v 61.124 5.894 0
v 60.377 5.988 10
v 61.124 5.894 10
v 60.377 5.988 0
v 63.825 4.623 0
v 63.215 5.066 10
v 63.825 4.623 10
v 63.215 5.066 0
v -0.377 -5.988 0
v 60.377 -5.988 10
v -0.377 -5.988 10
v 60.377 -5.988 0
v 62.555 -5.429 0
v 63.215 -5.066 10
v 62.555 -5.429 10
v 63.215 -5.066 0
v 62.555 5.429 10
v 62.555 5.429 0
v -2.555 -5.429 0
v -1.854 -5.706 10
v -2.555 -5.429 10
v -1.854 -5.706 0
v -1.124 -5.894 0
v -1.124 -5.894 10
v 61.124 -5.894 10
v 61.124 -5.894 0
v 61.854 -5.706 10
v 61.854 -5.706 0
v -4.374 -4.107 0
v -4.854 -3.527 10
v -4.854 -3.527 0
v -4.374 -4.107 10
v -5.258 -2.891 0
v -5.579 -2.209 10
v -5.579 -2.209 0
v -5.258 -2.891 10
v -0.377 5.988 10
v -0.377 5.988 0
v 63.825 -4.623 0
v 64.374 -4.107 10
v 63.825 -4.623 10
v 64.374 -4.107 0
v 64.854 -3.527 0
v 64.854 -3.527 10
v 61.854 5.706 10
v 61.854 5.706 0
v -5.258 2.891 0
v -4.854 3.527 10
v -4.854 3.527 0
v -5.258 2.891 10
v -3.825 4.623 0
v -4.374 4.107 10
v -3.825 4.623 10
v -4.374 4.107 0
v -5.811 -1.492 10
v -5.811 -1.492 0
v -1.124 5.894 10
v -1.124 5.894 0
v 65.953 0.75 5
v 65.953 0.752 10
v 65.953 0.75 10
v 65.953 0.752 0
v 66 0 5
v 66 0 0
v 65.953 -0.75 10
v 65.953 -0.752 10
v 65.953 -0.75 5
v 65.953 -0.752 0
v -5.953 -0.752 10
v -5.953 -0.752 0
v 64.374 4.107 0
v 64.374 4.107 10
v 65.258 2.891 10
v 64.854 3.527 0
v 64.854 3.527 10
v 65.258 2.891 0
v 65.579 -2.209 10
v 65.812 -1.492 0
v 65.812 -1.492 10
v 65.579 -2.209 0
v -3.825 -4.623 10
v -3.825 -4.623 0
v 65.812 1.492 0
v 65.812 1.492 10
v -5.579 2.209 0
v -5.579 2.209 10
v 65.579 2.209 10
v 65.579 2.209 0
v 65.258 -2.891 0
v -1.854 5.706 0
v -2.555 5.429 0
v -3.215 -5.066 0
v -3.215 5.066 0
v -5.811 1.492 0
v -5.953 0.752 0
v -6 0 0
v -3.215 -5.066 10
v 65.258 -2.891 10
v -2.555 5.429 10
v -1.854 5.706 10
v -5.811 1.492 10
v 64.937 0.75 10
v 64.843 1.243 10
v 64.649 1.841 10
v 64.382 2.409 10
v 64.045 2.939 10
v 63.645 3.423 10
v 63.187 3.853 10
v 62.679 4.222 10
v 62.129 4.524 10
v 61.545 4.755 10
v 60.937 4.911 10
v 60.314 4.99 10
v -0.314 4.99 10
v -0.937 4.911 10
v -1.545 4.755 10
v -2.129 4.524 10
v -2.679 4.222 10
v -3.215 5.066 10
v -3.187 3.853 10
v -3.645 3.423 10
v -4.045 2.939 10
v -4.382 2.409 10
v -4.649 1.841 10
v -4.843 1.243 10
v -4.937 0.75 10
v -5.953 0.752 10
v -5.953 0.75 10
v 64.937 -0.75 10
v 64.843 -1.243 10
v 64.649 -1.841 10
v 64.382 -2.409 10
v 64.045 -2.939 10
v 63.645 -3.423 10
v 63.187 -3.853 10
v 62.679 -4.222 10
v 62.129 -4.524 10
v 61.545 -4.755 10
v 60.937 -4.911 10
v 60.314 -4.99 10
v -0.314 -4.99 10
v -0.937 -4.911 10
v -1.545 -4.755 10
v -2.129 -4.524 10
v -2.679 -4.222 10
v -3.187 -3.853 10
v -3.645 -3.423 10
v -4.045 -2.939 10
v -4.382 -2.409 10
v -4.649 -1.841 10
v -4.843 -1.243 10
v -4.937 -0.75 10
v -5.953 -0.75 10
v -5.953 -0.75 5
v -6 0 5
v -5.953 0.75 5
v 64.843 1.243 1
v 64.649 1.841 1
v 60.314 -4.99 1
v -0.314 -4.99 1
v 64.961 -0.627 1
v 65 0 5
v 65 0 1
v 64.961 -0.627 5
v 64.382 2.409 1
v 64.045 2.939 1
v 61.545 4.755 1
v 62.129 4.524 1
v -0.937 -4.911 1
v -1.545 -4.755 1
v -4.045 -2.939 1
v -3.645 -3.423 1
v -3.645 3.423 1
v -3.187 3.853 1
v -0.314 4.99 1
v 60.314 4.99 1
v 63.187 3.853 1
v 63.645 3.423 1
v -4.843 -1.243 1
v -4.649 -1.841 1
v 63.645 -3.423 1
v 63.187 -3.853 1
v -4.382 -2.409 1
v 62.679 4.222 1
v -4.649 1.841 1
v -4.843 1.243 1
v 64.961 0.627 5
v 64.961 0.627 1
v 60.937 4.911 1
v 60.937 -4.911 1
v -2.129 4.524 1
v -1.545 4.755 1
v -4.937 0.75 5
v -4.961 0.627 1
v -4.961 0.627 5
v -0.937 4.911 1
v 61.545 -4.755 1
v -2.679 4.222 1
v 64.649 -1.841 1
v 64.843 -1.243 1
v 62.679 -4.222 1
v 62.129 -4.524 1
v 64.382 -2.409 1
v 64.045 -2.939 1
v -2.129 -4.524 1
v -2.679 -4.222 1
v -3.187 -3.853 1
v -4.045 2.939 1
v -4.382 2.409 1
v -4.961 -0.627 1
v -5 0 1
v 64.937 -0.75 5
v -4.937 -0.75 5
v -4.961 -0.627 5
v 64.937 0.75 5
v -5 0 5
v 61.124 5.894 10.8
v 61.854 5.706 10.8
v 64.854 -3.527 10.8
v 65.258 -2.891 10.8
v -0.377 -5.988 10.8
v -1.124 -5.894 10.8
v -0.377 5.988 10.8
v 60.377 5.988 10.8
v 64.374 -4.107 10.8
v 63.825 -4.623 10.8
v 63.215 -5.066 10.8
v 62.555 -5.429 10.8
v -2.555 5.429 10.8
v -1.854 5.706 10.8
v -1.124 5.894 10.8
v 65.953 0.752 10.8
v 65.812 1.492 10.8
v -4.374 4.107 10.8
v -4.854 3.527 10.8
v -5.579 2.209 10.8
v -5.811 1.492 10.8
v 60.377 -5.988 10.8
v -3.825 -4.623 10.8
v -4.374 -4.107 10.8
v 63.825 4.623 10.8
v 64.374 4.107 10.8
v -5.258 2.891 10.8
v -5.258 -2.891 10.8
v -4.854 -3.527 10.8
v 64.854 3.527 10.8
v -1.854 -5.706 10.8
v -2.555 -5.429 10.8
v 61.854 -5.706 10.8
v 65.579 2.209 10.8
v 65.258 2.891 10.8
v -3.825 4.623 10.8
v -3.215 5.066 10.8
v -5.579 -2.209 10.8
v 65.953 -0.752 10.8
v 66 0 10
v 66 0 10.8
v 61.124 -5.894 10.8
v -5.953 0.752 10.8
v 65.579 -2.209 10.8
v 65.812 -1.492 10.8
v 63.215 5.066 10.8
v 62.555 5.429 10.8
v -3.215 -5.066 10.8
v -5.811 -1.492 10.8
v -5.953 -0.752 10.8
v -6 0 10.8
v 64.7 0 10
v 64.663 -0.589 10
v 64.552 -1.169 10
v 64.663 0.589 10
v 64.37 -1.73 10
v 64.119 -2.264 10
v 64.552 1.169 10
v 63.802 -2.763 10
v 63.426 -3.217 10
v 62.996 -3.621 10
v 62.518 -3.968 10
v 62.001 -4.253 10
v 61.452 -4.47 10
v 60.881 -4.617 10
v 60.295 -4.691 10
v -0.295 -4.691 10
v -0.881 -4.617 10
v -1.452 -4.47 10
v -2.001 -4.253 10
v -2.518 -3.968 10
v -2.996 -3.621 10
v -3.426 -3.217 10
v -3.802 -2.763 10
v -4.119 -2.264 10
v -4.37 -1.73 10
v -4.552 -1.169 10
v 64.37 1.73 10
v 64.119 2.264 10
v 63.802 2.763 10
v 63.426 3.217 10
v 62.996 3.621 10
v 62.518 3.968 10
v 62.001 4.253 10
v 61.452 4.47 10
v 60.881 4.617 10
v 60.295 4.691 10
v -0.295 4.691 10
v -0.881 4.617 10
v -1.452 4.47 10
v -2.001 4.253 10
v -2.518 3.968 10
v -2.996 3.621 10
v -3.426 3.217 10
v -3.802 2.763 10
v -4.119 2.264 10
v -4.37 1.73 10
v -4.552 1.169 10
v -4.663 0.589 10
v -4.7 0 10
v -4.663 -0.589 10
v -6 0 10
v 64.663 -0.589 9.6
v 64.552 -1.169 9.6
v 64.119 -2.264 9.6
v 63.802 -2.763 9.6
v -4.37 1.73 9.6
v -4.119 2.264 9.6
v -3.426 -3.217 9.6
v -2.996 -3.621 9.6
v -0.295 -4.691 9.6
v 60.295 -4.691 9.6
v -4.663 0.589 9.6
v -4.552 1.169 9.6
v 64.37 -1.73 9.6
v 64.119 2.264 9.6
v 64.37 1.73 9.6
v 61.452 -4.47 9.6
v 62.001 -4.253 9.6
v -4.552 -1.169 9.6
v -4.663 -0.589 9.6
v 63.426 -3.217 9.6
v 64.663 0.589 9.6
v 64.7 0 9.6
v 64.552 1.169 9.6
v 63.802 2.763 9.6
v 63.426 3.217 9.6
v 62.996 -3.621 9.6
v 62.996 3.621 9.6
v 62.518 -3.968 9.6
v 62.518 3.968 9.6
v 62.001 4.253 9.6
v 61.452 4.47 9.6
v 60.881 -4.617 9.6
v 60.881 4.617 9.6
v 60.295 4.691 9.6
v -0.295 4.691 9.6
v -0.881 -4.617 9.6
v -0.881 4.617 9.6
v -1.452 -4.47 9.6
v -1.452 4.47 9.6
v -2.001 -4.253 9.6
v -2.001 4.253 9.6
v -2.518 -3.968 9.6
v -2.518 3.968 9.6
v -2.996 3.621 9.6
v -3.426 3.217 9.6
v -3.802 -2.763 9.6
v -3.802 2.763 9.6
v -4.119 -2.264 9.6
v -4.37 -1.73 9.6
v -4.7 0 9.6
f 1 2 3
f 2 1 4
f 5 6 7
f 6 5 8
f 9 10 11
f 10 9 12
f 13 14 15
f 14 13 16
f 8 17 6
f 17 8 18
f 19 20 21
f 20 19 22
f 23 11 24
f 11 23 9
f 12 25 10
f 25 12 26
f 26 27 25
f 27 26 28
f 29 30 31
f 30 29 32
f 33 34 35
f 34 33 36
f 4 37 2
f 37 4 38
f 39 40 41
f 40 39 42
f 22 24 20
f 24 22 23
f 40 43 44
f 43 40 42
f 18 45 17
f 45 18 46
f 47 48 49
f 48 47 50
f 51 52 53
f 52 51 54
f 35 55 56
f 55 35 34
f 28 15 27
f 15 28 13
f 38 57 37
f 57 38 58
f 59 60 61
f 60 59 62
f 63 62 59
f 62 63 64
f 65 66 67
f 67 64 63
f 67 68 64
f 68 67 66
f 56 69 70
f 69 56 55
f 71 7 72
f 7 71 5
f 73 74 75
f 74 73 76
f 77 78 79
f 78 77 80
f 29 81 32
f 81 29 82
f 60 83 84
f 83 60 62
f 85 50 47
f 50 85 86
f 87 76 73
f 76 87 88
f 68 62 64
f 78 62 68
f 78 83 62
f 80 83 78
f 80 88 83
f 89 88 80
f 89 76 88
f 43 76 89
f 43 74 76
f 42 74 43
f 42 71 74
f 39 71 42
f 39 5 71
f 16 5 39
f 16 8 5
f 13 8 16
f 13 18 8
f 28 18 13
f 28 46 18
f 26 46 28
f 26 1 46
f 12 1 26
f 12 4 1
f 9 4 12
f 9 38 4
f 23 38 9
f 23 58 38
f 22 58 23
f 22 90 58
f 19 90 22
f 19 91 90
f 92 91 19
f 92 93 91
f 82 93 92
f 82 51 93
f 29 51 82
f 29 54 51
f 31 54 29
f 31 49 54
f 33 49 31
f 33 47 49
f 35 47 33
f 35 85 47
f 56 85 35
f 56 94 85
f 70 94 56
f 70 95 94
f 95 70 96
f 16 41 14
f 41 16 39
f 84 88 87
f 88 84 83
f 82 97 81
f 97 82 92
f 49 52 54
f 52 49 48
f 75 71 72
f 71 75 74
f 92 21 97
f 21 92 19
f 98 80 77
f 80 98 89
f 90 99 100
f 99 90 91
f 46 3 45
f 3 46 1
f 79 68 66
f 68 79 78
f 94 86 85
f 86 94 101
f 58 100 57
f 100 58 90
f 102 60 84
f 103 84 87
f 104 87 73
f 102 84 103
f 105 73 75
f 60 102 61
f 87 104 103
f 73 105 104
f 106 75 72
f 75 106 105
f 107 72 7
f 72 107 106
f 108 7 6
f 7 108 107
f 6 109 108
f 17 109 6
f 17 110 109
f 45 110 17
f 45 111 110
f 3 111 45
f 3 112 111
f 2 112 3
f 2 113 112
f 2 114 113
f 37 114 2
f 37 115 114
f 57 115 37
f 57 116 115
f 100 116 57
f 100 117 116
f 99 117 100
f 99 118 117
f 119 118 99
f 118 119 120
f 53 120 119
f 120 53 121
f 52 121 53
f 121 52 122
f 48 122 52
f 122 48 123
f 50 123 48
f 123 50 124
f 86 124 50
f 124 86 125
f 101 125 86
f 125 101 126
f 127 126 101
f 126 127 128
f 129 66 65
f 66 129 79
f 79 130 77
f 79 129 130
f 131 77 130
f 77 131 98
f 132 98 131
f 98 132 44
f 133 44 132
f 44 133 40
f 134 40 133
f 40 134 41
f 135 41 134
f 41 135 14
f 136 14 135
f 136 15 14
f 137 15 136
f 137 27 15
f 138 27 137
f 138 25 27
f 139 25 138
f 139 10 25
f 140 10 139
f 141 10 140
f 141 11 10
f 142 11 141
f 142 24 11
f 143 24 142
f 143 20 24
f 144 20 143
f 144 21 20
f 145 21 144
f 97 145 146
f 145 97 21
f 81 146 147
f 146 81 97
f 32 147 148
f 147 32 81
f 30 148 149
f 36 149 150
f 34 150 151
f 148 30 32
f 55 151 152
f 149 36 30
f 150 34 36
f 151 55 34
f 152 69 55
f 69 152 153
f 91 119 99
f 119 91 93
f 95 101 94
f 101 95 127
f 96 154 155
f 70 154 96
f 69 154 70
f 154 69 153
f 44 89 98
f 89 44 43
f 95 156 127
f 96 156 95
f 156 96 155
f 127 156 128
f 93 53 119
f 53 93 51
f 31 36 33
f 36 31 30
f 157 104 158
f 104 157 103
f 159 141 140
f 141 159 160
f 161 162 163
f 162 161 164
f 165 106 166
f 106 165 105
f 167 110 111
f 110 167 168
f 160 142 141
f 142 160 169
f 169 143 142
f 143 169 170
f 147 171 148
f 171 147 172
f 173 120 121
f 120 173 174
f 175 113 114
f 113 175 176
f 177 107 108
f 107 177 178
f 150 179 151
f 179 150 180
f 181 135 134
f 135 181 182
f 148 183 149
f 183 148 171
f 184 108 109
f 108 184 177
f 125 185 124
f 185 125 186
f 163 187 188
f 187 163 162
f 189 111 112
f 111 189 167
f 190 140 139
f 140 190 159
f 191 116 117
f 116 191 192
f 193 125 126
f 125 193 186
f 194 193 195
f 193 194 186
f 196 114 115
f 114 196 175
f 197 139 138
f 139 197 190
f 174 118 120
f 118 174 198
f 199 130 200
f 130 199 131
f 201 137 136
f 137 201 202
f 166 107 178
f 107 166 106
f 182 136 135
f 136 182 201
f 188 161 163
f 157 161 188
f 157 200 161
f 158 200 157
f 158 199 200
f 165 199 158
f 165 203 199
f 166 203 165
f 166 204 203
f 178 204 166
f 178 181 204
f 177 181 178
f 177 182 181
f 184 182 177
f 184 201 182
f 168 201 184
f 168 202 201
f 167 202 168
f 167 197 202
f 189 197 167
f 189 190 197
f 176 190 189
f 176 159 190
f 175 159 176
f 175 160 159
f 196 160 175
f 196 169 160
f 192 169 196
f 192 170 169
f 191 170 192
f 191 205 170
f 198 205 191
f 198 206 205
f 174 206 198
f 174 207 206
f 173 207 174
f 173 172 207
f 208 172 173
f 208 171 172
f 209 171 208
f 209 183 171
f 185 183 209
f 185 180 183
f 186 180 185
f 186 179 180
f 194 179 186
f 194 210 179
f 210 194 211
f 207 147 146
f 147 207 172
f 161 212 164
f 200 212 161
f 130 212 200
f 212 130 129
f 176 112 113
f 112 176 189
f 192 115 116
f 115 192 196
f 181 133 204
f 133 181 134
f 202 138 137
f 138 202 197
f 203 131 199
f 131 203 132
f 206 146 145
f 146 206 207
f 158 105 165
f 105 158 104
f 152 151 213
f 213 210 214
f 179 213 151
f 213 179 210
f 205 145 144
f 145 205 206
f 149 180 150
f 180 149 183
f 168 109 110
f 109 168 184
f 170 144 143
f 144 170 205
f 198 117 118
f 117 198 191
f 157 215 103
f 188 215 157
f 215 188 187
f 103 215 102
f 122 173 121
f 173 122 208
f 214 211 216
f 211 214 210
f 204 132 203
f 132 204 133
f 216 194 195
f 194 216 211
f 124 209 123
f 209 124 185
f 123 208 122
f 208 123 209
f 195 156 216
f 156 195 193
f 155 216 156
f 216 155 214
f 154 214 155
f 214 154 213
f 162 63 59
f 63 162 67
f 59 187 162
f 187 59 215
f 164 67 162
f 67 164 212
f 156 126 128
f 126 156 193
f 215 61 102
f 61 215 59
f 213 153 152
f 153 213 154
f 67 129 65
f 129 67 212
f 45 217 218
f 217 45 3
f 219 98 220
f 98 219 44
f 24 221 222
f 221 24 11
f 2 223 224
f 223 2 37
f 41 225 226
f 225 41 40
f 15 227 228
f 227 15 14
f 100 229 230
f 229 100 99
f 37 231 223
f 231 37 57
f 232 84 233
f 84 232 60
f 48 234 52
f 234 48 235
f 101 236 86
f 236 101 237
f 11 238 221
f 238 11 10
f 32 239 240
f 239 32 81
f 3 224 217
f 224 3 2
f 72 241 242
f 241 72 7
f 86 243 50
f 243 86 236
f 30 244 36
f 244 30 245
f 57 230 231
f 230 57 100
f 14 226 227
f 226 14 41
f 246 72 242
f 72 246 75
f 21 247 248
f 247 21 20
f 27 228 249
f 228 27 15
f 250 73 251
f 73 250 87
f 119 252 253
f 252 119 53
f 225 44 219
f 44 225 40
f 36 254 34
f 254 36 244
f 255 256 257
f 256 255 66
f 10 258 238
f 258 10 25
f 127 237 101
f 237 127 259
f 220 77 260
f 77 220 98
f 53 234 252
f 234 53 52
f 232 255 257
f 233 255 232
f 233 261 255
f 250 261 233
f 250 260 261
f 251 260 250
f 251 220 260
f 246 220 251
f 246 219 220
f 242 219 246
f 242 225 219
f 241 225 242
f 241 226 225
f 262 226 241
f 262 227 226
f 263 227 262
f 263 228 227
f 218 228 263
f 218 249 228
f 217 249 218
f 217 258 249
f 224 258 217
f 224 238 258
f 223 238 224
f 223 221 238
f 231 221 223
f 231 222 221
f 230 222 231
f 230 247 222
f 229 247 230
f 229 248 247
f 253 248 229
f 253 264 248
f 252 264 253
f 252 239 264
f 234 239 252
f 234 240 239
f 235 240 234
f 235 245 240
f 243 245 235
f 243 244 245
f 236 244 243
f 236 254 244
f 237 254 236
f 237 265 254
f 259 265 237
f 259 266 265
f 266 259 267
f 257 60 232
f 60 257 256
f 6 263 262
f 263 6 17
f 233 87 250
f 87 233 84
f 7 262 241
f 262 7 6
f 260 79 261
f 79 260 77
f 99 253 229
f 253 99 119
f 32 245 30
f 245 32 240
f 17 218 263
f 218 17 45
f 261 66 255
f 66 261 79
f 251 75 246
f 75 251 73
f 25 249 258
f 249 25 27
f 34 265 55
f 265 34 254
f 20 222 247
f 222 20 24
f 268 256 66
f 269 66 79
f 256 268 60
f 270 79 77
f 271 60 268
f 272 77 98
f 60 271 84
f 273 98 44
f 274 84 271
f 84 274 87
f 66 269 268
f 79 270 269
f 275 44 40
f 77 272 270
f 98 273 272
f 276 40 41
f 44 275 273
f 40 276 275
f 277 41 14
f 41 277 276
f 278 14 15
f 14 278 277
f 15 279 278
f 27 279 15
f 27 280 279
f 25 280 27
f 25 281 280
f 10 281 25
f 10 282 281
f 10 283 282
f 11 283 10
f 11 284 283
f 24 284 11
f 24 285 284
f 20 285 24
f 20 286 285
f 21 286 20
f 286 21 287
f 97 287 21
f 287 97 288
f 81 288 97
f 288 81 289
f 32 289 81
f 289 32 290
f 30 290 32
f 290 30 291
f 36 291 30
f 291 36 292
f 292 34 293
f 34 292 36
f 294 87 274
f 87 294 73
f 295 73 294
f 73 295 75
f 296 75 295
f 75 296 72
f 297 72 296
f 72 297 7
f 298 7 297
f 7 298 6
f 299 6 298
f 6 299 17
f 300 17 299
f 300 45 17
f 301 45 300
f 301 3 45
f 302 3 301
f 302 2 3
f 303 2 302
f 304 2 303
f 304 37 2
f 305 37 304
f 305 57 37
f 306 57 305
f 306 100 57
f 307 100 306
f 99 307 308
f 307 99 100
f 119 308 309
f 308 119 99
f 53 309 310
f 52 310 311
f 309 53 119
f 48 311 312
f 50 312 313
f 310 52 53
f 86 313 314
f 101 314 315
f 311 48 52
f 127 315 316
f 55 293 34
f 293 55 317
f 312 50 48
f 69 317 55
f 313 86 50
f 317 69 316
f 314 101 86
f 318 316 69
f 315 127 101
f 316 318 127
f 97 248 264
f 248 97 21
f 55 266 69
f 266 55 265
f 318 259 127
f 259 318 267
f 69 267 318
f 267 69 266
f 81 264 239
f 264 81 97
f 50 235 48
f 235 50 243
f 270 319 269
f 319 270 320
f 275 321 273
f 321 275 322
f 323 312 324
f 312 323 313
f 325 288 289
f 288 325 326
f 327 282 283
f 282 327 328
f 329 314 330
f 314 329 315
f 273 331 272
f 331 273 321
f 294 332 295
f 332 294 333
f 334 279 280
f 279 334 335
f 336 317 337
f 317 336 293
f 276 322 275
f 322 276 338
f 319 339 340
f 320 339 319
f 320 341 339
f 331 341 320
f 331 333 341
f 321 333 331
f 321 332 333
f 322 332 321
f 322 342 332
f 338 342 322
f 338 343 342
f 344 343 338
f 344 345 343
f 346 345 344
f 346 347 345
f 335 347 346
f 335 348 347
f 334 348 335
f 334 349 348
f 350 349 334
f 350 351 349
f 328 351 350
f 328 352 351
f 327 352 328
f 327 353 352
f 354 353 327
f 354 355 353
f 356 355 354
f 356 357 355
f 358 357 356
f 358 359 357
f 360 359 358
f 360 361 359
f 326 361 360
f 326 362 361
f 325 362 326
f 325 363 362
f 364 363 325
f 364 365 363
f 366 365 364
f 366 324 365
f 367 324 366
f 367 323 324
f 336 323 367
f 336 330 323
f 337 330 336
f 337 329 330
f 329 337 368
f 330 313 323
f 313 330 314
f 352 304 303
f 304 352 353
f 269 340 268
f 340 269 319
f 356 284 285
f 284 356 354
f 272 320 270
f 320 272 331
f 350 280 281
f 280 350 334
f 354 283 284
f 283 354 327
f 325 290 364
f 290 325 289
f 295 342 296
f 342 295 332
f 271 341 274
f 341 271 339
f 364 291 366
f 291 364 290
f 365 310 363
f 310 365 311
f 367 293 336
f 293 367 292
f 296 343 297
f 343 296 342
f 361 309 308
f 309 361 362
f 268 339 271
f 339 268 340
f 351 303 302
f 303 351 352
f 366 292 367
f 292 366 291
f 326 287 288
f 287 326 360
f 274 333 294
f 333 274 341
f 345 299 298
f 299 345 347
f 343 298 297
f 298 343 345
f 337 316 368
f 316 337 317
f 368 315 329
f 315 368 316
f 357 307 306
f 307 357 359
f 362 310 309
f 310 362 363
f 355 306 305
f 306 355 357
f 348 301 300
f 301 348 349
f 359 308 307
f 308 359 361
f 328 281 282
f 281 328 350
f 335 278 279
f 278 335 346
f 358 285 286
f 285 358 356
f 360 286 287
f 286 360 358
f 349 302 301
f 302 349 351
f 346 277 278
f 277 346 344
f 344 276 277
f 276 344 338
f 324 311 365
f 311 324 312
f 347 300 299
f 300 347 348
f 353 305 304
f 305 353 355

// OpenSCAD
$fn = 50;

ro = 6;
ri = 5;
ctr_dist = 60;
box_height = 10;

lid_thk = 0.8;
lap_thk = 0.4;

module potting_box() {
    difference() {
        union() {
            //cube([60, 12, 12]);
            hull() {
                cylinder(box_height, r=ro);
                translate([ctr_dist, 0, 0]) cylinder(box_height, r=ro);
            }
            
            
        }   
        //translate([7.75, 80-19-25]) square([71.5, 25]); // screen
        // inner cut-out
        translate([0, 0, 1]) hull() {
            cylinder(100, r=ri);
            translate([ctr_dist, 0, 0]) cylinder(100, r=ri);
        }
        // cut slot as one big slit
        translate([-20, -0.75, 5]) cube([100, 1.5, 100], center=false);
    }
}

module lid() {
    union() {
        hull() {
            cylinder(lid_thk, r=ro);
            translate([ctr_dist, 0, 0]) cylinder(lid_thk, r=ro);
        }
        hull() {
            cylinder(lid_thk+lap_thk, r=ri-0.3);
            translate([ctr_dist, 0, 0]) cylinder(lid_thk+lap_thk, r=ri-0.3);
        }
        
    }
}

potting_box();
translate([0,0,box_height+lid_thk]) rotate([180, 0, 0]) lid();
